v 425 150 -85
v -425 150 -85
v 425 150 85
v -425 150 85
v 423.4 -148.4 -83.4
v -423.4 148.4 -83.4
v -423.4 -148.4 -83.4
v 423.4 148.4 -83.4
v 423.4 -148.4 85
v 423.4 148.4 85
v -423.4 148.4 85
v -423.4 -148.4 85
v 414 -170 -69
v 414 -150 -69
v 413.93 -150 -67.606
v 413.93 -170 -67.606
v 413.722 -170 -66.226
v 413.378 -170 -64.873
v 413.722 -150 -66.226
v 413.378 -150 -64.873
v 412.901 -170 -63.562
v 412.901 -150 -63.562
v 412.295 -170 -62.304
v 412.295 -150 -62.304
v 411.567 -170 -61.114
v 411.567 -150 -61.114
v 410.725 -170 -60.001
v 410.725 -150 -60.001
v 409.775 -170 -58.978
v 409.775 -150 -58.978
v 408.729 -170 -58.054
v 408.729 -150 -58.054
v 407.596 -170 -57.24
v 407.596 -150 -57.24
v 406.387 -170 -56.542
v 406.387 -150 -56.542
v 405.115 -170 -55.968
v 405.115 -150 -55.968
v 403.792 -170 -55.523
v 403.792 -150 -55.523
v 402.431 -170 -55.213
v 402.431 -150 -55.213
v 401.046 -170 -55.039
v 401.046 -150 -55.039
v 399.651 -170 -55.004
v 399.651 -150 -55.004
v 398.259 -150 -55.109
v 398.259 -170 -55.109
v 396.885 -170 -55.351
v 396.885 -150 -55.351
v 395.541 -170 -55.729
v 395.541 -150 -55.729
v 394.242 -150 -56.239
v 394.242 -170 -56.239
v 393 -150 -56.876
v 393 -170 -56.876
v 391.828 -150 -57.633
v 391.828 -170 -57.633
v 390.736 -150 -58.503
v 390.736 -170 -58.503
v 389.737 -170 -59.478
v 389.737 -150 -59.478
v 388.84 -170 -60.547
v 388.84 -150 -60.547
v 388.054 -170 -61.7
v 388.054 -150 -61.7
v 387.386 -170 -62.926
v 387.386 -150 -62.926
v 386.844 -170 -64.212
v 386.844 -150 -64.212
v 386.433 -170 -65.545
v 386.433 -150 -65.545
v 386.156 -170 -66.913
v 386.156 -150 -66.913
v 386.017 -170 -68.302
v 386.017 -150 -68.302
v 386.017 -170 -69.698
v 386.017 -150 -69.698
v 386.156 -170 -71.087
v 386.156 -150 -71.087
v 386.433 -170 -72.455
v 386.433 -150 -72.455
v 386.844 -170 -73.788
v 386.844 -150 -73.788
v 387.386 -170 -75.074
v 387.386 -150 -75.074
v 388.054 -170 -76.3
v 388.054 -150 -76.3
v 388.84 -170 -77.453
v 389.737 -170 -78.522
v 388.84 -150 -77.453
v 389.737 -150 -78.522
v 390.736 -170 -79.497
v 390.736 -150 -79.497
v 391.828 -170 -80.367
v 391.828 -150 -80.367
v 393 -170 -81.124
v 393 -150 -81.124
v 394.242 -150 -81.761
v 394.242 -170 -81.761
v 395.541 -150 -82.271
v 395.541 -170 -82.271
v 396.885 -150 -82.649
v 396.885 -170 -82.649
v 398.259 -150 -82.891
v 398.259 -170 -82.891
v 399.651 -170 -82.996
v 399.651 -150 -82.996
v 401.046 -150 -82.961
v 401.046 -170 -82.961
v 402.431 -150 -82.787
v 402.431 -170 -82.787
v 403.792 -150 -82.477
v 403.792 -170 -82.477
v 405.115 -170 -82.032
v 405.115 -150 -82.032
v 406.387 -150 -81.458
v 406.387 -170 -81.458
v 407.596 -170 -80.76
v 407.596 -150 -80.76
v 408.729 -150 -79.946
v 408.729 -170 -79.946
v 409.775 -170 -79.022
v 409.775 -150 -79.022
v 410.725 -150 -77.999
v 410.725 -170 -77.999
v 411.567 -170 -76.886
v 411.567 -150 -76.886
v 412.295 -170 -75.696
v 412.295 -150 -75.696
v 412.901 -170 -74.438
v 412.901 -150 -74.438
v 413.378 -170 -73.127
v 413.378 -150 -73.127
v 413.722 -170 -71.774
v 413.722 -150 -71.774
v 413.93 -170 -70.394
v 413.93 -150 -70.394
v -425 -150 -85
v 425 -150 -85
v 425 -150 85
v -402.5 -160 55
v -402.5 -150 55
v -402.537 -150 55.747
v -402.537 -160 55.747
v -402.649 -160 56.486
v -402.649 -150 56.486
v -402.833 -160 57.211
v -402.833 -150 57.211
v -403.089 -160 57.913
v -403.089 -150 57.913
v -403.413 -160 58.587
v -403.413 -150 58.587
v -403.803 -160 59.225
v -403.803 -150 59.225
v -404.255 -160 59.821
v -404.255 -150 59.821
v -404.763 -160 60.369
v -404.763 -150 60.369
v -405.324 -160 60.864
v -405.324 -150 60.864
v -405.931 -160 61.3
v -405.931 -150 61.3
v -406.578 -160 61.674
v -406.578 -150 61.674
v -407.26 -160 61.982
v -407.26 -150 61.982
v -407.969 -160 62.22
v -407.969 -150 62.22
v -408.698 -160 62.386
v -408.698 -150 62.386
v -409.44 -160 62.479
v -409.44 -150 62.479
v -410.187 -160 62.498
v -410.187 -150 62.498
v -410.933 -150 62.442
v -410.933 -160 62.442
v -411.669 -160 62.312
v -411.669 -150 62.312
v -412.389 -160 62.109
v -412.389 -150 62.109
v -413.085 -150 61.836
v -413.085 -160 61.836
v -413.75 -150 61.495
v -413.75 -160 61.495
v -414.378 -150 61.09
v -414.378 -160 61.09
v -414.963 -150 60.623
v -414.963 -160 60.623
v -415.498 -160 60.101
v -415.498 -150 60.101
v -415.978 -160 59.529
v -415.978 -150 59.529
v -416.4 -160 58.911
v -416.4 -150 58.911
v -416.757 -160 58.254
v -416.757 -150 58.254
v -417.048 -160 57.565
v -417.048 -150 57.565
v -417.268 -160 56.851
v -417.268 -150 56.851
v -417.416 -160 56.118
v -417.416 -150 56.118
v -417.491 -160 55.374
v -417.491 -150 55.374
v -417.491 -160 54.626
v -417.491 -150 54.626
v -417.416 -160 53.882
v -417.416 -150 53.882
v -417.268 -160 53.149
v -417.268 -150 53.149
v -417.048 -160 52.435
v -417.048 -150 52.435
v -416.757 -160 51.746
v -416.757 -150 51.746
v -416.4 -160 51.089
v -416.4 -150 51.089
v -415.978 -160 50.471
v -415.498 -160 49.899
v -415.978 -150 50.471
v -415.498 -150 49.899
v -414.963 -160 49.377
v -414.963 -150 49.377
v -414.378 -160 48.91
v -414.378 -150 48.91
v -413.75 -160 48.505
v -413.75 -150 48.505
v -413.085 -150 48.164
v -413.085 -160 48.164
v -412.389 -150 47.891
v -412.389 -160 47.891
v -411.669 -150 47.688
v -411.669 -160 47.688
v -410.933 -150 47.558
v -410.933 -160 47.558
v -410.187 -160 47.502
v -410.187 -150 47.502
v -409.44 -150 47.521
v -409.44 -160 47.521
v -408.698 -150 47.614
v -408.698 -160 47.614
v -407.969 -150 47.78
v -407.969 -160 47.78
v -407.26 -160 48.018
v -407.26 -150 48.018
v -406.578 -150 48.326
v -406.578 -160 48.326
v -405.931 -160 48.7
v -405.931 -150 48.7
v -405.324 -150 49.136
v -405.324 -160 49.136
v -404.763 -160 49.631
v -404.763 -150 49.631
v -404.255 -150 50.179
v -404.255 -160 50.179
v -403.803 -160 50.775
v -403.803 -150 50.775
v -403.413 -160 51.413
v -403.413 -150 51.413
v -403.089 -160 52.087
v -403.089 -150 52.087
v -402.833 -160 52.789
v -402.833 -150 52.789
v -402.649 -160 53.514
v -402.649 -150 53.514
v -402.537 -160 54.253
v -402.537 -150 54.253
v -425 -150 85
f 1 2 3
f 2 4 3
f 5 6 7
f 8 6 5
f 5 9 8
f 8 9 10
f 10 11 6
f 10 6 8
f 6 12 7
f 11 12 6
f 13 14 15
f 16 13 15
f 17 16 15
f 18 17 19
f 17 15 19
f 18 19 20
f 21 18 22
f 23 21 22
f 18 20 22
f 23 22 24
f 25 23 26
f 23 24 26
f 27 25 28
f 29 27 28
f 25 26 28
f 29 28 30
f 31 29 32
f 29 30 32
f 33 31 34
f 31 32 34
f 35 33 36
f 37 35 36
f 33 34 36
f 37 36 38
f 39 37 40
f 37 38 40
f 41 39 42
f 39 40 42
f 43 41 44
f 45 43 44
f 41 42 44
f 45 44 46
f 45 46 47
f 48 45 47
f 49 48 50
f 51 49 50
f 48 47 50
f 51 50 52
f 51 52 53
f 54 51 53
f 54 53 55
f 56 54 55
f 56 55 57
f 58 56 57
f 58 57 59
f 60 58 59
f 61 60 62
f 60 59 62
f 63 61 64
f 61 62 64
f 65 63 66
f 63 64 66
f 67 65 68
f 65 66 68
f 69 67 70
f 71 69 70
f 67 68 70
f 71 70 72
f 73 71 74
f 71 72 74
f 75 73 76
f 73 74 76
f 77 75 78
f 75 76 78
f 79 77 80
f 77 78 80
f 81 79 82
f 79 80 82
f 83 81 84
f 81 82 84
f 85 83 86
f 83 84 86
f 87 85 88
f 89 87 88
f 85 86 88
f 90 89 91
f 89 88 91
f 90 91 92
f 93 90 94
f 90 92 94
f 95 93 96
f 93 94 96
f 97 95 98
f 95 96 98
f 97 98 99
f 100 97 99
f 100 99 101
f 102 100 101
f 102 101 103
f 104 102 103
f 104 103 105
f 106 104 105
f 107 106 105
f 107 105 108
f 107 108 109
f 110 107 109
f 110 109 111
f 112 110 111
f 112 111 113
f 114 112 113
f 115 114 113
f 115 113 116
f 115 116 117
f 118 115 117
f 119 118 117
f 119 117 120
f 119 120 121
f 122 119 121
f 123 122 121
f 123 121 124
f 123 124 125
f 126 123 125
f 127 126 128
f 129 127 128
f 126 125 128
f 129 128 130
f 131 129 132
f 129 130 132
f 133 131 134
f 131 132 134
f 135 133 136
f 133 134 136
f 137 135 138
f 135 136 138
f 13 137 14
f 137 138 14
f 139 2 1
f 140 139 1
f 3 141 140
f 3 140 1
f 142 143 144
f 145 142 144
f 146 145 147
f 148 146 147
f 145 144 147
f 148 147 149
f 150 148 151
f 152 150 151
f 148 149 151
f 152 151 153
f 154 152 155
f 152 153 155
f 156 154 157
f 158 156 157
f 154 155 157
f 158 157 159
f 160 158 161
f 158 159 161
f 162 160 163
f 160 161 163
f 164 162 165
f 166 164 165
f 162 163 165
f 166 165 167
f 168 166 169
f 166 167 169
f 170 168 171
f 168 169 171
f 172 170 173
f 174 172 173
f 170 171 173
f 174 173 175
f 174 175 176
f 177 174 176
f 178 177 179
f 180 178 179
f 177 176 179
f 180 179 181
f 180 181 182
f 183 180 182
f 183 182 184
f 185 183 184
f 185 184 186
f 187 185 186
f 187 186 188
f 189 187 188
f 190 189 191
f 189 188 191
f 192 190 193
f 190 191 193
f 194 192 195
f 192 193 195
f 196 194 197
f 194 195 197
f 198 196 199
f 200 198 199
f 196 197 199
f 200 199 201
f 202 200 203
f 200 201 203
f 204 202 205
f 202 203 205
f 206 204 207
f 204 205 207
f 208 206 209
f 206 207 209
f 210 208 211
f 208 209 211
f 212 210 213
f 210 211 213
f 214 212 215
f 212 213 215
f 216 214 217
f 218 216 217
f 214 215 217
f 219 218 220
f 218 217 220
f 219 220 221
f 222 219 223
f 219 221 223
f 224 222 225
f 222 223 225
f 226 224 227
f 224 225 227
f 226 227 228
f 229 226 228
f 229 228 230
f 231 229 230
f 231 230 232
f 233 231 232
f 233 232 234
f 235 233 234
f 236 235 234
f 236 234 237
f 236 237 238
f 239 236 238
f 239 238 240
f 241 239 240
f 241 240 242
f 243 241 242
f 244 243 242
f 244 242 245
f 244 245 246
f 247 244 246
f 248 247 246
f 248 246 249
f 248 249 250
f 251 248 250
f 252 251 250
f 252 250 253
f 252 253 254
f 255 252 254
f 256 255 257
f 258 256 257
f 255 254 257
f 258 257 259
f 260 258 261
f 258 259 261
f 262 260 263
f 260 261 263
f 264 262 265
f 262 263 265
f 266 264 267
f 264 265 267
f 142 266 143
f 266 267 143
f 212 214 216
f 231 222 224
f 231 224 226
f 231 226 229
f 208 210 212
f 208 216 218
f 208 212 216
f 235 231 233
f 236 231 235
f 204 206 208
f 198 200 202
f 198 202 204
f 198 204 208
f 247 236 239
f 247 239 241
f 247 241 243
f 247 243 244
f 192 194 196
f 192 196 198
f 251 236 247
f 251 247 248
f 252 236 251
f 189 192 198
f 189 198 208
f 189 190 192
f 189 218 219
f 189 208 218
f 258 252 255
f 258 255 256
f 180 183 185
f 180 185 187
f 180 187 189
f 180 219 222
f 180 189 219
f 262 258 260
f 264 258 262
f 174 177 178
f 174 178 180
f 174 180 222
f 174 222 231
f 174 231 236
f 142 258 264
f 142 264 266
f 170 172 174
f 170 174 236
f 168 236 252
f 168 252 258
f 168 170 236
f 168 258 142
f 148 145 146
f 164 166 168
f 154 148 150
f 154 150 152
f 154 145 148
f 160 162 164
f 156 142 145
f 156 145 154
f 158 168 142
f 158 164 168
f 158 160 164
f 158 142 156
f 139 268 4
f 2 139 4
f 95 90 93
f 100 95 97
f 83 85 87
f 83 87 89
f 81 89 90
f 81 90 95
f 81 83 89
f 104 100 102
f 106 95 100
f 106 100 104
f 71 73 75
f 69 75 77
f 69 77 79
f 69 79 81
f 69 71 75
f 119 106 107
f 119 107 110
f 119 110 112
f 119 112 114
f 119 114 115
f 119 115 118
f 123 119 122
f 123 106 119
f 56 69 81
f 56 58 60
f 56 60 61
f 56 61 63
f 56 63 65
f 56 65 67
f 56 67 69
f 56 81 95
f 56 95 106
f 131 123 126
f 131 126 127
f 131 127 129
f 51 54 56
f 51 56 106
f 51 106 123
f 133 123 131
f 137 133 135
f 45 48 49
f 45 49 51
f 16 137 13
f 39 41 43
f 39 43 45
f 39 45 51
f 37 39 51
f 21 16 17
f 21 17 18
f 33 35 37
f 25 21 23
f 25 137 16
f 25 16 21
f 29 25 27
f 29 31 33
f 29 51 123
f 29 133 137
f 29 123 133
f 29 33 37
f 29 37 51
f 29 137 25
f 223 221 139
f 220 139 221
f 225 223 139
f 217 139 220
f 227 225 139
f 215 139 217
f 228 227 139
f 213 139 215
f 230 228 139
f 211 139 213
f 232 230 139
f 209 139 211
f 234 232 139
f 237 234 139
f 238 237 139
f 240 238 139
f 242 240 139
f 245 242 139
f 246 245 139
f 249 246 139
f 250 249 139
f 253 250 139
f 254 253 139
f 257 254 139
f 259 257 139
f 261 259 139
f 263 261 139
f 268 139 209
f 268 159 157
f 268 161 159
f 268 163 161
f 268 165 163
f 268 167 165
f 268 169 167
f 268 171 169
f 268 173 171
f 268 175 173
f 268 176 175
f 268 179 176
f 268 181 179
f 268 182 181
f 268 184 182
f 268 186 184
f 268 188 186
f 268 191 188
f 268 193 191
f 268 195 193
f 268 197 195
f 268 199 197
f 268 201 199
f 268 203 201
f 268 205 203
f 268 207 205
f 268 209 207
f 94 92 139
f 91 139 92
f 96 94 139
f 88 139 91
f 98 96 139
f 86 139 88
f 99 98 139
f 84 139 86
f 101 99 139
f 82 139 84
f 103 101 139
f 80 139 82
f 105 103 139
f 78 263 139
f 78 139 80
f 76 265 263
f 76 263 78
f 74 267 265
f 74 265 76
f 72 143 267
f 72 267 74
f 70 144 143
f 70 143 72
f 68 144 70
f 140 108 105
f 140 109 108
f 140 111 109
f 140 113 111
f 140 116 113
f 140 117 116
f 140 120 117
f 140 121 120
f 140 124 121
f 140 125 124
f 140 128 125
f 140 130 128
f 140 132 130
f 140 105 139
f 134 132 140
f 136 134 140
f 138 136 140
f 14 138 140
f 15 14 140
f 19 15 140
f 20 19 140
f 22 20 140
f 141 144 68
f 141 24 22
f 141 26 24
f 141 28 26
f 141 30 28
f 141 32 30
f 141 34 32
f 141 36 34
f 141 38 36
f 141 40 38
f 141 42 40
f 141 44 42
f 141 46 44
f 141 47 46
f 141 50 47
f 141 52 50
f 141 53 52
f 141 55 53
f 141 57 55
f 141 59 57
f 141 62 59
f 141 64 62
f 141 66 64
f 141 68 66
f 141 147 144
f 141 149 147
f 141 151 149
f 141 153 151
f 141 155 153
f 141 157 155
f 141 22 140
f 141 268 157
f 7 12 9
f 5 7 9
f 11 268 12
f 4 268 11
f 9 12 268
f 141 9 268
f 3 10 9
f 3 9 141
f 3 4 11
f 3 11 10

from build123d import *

# Parameters (mm, degrees)
F0_W          = 850
F0_H          = 300
F1_DEPTH      = 85
F1_DEPTH_BACK = 85
F2_T          = -1.6
F3_R          = 14
F4_DEPTH      = 20
F5_R          = 7.5
F6_DEPTH      = 10


with BuildPart() as f1:
    # F0 (on Top) → F1 (new body, two sides)
    with BuildSketch(Plane.XY) as f1_sk:
        Rectangle(F0_W, F0_H)
    extrude(amount=F1_DEPTH)
    extrude(f1_sk.sketch, amount=-F1_DEPTH_BACK)

    # F2
    f2_openings = [f1.faces().sort_by_distance(p)[0] for p in [
        (0, 0, 85),
    ]]
    offset(amount=F2_T, openings=f2_openings)

    # F3 (on face) → F4 (join)
    with BuildSketch(Plane.XZ.offset(150)):
        with Locations((400, -69)):
            Circle(F3_R)
    extrude(amount=F4_DEPTH)

    # F5 (on face) → F6 (join)
    with BuildSketch(Plane.XZ.offset(150)):
        with Locations((-410, 55)):
            Circle(F5_R)
    extrude(amount=F6_DEPTH)


solid = f1.part
